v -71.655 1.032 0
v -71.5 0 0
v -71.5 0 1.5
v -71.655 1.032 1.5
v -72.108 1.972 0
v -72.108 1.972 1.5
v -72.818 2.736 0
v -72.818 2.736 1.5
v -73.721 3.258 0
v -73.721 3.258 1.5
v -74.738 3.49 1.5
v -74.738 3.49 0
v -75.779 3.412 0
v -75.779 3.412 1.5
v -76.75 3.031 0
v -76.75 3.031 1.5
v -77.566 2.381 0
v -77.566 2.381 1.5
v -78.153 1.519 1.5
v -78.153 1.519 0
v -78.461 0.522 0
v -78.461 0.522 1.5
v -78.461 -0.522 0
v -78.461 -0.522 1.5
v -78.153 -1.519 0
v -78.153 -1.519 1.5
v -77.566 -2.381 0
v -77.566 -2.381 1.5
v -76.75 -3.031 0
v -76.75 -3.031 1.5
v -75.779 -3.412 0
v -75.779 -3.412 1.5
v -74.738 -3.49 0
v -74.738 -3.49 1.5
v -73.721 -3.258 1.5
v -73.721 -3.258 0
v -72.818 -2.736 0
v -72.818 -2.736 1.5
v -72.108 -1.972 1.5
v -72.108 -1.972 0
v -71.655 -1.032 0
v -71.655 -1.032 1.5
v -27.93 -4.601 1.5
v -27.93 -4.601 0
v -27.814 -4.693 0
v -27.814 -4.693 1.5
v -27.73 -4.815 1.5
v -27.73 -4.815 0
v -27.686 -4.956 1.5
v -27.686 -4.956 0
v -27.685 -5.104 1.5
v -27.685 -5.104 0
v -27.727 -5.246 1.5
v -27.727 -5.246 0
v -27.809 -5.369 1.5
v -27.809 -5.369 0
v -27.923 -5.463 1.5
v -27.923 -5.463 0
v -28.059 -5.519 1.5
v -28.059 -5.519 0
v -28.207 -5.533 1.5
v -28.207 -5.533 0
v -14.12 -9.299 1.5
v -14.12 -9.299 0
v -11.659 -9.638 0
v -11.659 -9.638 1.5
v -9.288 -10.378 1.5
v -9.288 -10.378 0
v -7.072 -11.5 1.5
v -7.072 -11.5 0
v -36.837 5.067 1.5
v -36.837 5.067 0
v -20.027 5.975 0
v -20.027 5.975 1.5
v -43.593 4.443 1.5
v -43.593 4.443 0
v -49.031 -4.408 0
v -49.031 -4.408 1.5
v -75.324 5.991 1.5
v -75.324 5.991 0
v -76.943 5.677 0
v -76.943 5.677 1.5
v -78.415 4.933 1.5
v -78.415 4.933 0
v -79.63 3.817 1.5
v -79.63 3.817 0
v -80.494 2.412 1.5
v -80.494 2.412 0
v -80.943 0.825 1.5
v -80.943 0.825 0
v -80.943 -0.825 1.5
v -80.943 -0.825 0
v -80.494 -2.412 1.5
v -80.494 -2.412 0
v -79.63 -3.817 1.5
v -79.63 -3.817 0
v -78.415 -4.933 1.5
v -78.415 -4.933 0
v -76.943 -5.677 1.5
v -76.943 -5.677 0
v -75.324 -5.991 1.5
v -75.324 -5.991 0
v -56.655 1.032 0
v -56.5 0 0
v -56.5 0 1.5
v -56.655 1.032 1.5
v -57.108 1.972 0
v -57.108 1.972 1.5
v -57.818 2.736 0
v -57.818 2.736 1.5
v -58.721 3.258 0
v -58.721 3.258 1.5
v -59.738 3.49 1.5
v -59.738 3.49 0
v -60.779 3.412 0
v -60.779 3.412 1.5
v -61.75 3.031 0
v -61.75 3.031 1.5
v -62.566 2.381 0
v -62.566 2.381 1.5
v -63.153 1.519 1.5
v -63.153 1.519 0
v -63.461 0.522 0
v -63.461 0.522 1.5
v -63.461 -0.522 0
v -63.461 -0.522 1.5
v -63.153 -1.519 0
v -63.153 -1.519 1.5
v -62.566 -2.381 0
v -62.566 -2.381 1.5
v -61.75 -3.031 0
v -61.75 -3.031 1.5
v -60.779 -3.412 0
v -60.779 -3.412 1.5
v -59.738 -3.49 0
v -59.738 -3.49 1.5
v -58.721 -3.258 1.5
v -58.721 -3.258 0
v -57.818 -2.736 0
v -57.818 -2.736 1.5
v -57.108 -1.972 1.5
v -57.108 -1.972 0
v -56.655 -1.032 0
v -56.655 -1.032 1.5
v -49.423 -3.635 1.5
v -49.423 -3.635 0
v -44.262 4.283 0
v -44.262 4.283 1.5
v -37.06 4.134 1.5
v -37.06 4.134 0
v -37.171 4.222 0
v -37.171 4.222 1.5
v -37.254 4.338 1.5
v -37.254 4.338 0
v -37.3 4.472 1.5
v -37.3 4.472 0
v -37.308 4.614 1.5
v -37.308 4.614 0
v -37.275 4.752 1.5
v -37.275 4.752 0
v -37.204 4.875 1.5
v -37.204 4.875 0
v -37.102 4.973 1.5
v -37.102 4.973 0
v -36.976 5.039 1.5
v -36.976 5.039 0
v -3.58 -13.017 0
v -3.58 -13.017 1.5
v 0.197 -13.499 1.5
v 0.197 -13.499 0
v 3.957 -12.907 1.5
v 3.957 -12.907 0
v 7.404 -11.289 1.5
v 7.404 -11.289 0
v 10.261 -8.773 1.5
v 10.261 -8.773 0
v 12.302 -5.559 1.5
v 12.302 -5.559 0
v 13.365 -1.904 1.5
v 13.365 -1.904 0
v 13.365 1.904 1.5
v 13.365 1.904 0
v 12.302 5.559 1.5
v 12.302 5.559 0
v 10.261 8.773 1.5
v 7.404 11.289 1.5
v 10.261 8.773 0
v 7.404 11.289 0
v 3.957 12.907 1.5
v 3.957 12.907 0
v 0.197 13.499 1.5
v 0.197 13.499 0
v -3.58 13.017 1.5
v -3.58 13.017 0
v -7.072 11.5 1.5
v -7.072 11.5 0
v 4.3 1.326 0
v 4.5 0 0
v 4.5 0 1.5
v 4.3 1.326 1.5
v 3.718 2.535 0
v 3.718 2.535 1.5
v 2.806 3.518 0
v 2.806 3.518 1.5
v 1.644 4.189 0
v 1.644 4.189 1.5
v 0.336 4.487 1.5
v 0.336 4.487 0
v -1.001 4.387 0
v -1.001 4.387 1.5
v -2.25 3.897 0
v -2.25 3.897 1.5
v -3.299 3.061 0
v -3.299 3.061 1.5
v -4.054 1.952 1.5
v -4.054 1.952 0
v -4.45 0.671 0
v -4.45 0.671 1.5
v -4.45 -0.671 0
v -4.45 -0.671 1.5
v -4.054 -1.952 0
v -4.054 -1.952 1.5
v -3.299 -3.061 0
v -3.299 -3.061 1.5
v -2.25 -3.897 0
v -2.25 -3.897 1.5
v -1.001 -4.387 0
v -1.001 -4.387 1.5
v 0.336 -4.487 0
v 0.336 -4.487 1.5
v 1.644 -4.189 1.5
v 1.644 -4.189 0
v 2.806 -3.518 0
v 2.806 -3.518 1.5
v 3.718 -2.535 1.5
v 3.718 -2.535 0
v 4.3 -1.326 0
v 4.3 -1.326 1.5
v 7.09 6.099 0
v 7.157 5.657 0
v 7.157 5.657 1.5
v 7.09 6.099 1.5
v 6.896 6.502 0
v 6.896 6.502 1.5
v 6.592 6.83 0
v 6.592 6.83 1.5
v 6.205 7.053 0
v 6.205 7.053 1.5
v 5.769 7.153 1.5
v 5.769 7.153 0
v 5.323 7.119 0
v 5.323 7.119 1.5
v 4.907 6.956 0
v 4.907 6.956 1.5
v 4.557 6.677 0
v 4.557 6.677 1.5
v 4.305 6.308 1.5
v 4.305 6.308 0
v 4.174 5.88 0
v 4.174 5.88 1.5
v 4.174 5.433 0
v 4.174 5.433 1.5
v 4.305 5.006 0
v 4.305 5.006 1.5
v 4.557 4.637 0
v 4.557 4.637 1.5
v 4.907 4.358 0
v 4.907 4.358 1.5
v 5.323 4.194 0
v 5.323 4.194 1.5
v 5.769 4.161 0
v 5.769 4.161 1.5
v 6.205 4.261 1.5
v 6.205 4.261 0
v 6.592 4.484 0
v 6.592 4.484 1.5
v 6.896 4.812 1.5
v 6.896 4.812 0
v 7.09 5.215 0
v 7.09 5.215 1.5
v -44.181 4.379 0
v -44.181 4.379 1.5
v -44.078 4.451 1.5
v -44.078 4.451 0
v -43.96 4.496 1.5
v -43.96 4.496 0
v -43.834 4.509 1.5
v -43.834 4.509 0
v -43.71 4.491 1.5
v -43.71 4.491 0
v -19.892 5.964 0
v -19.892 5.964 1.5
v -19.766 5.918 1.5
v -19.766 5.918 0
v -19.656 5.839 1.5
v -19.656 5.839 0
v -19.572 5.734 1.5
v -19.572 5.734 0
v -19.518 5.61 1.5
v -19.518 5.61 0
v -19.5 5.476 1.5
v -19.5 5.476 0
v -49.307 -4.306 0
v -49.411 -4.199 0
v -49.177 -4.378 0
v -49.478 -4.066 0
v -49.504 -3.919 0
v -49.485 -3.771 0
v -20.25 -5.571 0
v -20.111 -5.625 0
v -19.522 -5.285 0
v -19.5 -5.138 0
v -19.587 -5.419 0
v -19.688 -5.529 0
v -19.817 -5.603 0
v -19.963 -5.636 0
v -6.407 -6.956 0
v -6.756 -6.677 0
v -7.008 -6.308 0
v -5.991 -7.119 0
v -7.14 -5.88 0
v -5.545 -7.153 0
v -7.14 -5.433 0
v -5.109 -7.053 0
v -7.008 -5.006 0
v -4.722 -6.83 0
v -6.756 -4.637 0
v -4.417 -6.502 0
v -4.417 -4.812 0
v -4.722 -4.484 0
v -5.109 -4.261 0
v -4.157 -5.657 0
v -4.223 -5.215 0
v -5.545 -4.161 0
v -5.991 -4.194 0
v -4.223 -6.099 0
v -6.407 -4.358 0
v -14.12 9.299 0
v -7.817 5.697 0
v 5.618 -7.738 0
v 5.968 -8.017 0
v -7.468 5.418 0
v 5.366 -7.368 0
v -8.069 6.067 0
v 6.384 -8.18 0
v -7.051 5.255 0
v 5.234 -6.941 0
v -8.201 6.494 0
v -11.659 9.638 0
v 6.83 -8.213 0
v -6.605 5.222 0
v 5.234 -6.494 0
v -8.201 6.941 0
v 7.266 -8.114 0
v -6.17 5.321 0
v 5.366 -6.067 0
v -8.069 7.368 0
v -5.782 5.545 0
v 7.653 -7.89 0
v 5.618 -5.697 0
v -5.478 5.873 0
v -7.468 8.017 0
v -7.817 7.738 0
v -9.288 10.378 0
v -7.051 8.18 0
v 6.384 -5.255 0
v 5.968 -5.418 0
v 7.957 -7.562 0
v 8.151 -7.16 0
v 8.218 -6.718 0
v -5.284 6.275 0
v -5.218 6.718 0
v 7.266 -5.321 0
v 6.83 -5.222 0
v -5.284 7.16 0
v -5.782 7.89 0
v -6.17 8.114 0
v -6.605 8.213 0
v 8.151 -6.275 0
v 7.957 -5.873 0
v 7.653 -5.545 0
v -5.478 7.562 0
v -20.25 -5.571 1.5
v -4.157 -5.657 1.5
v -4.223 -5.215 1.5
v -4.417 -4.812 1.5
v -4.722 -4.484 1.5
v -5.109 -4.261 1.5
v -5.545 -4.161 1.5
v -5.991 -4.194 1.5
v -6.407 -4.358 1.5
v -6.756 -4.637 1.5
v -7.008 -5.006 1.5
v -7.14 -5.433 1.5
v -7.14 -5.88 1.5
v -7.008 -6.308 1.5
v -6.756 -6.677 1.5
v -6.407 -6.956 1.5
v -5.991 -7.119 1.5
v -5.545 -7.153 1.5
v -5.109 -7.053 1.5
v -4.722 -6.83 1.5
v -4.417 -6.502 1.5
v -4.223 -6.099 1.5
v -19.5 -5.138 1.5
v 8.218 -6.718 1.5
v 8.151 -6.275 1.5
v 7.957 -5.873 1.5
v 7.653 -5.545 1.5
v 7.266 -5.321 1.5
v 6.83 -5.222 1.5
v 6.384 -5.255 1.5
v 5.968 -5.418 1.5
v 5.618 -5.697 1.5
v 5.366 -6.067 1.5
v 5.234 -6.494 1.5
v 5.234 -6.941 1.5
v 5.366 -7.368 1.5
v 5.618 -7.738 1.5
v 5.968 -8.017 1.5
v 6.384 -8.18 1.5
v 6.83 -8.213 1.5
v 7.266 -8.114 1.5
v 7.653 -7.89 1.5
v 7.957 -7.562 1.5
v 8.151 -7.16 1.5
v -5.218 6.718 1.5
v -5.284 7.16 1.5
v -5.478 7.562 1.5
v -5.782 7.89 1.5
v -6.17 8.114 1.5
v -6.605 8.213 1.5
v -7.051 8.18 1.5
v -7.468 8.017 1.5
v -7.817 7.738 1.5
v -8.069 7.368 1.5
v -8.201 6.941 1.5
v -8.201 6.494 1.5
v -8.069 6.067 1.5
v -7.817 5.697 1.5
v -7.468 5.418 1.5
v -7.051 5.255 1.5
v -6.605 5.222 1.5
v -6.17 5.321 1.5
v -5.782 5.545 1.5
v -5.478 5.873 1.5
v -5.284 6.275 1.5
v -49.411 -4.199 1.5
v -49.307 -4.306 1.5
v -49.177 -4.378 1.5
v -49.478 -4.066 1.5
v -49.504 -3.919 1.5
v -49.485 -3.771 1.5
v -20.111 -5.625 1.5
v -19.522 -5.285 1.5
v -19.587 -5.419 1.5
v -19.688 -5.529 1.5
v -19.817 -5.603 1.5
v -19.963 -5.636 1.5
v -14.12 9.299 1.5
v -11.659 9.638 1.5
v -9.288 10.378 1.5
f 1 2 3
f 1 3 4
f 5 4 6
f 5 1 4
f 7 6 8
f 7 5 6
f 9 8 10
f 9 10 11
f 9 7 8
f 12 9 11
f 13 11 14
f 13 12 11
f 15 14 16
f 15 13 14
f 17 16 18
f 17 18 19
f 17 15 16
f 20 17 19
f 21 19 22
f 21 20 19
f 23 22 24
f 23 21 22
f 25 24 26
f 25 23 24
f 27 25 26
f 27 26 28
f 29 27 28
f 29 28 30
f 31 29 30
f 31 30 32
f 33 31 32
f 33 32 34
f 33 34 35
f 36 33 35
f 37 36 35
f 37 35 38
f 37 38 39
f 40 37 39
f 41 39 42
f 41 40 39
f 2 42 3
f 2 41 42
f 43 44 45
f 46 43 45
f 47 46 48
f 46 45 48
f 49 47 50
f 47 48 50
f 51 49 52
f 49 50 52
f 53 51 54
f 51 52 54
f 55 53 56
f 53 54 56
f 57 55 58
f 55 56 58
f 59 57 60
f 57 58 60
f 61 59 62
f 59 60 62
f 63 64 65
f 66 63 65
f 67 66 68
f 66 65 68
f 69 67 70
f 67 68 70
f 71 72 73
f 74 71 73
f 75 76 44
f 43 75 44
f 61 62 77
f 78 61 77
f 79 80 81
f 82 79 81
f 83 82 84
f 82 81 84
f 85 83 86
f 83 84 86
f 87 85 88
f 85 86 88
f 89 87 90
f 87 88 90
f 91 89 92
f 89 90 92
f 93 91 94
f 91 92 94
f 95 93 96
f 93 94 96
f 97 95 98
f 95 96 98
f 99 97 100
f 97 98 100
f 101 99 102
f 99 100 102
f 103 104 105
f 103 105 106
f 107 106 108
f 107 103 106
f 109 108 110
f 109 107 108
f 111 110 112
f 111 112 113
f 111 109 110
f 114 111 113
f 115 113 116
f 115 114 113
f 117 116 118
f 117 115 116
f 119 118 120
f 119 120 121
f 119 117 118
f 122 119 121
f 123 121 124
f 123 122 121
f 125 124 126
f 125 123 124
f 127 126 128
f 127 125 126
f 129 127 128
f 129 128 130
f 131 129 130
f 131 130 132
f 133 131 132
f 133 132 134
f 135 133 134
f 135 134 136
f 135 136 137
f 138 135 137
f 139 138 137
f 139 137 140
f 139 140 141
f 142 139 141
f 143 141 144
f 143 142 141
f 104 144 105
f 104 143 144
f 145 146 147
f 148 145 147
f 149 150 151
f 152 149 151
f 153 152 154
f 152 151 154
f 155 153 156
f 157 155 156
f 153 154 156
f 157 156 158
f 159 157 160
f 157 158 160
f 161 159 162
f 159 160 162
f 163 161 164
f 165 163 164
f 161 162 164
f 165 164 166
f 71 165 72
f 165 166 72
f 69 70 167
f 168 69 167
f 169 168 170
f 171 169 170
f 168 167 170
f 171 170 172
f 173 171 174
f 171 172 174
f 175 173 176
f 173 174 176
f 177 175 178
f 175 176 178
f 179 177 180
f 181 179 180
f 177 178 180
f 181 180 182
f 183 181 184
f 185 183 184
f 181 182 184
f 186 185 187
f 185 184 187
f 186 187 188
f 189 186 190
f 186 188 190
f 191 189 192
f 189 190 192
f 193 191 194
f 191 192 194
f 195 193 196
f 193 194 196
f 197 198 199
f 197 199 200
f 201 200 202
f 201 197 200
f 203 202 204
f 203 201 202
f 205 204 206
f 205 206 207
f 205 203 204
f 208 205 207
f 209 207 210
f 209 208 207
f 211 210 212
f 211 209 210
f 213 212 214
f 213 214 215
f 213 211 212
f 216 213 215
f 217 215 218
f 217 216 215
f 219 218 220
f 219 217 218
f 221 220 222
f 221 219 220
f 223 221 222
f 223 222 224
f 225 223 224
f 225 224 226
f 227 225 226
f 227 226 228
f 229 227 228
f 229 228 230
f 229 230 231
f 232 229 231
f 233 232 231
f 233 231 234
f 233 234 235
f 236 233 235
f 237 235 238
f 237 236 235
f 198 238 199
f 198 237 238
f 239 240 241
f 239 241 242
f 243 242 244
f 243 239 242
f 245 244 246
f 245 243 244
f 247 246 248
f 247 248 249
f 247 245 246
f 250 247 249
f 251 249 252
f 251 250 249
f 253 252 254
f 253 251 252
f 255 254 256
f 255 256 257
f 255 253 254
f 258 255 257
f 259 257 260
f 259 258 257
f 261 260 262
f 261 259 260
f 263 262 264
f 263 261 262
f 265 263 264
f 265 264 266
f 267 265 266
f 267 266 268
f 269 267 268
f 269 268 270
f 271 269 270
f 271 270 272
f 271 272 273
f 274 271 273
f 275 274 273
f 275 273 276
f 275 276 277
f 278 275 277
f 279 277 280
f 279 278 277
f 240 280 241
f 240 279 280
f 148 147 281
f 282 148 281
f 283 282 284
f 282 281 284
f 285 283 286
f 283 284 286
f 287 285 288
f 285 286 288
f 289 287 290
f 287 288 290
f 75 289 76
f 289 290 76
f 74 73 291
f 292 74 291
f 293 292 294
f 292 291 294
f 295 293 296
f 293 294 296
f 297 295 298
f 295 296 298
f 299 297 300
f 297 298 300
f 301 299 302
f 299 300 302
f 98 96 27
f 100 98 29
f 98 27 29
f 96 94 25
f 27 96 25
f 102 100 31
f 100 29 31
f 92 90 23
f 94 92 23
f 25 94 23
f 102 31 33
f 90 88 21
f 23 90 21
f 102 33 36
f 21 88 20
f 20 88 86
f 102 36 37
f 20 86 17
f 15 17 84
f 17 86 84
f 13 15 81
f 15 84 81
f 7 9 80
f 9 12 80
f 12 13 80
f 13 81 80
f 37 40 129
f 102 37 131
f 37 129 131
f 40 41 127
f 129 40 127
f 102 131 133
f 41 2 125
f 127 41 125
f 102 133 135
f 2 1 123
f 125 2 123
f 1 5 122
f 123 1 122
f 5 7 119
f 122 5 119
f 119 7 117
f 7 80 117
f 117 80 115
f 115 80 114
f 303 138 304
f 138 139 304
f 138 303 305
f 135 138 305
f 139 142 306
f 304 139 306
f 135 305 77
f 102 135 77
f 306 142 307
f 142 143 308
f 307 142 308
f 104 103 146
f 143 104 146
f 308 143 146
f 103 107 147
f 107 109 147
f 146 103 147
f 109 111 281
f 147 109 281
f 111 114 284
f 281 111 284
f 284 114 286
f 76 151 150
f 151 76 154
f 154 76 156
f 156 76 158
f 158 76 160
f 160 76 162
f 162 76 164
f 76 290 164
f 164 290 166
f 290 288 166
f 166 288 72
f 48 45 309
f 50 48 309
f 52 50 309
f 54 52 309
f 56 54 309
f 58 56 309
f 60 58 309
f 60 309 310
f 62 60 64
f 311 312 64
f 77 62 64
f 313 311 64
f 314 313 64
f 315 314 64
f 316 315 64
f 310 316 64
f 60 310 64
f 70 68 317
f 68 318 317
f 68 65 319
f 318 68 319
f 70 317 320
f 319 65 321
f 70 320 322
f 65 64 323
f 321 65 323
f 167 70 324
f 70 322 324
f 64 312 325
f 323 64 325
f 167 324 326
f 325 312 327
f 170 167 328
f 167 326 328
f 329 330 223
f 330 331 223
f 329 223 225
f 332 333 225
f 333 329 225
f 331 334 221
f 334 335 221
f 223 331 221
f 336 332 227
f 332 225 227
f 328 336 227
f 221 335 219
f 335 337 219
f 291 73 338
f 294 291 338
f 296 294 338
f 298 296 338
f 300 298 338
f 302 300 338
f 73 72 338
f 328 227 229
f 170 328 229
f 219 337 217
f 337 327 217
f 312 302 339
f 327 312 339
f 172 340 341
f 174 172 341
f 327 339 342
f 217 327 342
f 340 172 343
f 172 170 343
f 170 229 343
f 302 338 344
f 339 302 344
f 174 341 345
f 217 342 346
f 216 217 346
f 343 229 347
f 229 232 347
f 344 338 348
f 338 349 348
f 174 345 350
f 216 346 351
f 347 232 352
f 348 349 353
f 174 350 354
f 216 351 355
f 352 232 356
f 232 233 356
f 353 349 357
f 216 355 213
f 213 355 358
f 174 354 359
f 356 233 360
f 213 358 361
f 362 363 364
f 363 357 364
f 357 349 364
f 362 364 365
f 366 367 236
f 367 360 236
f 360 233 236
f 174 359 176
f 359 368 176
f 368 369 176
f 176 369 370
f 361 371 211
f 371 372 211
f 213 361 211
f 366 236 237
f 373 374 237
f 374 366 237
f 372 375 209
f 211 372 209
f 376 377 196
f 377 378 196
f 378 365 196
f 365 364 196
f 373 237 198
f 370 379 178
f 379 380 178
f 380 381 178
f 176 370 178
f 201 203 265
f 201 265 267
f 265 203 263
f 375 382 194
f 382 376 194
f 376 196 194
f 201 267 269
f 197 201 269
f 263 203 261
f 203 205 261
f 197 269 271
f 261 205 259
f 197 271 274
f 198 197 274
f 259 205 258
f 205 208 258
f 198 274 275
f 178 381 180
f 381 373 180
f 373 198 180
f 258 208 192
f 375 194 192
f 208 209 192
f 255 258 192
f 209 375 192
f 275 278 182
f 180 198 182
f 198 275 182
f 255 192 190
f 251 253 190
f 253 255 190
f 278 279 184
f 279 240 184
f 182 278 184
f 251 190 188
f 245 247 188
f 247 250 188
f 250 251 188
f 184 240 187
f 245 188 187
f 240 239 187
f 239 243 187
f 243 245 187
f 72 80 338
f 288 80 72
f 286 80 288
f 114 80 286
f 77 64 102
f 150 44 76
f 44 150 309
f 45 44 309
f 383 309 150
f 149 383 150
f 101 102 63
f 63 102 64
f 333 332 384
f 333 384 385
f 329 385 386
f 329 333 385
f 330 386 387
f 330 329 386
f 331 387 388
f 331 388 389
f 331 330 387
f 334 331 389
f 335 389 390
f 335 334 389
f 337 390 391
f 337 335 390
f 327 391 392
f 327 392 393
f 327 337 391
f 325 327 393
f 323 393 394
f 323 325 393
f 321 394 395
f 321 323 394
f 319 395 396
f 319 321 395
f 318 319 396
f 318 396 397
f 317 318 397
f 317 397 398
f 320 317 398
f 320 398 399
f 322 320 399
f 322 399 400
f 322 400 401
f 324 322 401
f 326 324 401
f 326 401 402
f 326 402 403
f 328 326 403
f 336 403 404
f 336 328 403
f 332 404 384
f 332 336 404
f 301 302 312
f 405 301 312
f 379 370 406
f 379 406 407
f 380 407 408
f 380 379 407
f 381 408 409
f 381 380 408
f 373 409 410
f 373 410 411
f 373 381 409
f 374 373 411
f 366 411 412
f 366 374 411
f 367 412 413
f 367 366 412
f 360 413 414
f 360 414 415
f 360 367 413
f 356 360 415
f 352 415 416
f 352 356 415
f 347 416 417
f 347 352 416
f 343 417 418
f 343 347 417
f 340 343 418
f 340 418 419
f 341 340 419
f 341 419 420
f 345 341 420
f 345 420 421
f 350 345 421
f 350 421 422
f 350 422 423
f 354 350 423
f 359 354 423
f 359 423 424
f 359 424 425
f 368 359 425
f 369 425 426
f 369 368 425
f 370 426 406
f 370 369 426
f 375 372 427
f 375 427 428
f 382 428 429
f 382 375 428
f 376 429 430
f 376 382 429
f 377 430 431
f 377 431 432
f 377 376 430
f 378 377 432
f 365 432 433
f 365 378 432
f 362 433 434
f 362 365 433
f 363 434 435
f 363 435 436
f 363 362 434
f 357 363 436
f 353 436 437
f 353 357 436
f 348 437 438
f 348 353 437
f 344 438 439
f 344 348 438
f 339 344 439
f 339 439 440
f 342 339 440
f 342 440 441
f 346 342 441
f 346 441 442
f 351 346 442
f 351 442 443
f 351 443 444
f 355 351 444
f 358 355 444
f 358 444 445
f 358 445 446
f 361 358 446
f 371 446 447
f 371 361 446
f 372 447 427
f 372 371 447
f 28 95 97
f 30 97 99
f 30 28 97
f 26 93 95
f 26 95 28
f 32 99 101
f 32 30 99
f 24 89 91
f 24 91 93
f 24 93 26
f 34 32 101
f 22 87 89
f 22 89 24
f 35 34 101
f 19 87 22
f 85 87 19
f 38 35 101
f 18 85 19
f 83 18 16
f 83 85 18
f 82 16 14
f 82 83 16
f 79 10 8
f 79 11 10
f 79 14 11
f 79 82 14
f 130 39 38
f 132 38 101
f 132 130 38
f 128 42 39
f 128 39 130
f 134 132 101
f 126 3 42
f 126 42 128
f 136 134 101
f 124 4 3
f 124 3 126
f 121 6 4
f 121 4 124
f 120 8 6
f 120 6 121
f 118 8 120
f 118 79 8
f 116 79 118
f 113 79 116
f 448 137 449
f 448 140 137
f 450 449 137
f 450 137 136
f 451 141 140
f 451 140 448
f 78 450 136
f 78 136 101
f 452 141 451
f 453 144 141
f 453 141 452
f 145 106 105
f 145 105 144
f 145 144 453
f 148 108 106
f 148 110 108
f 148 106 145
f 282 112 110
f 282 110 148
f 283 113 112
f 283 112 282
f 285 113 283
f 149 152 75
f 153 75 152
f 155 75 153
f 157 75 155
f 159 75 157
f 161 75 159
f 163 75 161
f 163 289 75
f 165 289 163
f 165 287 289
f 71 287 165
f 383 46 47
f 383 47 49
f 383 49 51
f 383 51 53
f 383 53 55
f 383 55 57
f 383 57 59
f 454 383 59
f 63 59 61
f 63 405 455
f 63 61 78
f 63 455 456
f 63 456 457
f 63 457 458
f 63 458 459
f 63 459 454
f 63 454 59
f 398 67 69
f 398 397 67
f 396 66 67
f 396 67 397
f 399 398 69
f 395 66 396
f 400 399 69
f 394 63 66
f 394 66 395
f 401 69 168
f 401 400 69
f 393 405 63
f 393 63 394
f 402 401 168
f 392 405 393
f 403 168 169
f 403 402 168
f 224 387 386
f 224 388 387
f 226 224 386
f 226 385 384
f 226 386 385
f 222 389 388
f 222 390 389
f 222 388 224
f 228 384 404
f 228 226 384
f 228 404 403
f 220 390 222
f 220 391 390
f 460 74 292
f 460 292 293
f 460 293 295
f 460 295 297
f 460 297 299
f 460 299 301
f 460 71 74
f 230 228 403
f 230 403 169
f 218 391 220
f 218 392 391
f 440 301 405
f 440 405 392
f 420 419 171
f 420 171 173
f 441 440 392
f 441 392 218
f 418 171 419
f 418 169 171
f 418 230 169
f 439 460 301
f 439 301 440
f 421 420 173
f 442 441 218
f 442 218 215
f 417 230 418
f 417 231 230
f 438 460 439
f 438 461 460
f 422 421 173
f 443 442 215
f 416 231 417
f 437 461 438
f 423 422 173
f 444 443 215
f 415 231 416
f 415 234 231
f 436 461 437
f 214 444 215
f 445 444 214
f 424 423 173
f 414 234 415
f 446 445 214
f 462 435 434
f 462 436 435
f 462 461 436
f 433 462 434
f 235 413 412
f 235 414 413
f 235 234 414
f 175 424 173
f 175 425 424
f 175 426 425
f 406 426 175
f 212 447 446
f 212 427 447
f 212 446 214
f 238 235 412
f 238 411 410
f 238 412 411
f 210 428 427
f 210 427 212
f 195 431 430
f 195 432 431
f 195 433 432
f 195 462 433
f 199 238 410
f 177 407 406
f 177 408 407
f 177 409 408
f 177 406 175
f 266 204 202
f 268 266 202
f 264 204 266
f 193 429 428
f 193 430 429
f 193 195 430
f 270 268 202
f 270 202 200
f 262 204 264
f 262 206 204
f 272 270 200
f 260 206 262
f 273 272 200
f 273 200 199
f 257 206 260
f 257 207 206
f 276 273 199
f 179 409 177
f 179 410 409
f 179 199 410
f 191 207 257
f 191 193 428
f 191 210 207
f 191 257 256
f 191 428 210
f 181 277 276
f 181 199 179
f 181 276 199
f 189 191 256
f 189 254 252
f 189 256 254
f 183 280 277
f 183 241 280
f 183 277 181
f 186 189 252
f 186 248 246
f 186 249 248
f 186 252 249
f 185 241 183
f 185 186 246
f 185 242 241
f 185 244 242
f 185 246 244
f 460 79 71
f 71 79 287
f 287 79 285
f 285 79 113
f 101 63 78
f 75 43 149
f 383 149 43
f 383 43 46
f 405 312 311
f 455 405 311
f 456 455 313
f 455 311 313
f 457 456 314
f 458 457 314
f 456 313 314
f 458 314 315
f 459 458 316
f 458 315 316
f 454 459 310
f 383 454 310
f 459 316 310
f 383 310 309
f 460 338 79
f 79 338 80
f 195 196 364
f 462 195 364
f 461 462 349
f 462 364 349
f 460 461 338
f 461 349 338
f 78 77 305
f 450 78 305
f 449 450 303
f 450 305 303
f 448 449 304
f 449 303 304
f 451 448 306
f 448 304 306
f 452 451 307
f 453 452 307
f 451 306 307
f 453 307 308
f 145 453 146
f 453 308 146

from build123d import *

# Parameters (mm, degrees)
SKETCH_1_R      = 1.5
SKETCH_1_R_2    = 4.5
SKETCH_1_R_3    = 3.5
EXTRUDE_1_DEPTH = 1.5


with BuildPart() as part:
    # 草图1 → 凸台-拉伸1 (new body)
    with BuildSketch(Plane.XY):
        with BuildLine():
            Line((-14.119787017, 9.298767484), (-75.323772101, 5.991257934))
            ThreePointArc((-75.323772101, 5.991257934), (-81, 0), (-75.323772101, -5.991257934))
            Line((-75.323772101, -5.991257934), (-14.119787017, -9.298767484))
            ThreePointArc((-14.119787017, -9.298767484), (-10.458227409, -9.958733326), (-7.071734496, -11.499590046))
            ThreePointArc((-7.071734496, -11.499590046), (13.5, 0), (-7.071734496, 11.499590046))
            ThreePointArc((-7.071734496, 11.499590046), (-10.458227409, 9.958733326), (-14.119787017, 9.298767484))
        make_face()
        with Locations((-5.656854249, -5.656854249)):
            Circle(SKETCH_1_R, mode=Mode.SUBTRACT)
        with Locations((-6.717514421, 6.717514421)):
            Circle(SKETCH_1_R, mode=Mode.SUBTRACT)
        with Locations((5.656854249, 5.656854249)):
            Circle(SKETCH_1_R, mode=Mode.SUBTRACT)
        with Locations((6.717514421, -6.717514421)):
            Circle(SKETCH_1_R, mode=Mode.SUBTRACT)
        Circle(SKETCH_1_R_2, mode=Mode.SUBTRACT)
        with Locations((-60, 0)):
            Circle(SKETCH_1_R_3, mode=Mode.SUBTRACT)
        with Locations((-75, 0)):
            Circle(SKETCH_1_R_3, mode=Mode.SUBTRACT)
        with BuildLine():
            Line((-19.5, 5.475889357), (-19.5, -5.137613899))
            ThreePointArc((-19.5, -5.137613899), (-19.75, -5.570626601), (-20.25, -5.570626601))
            Line((-20.25, -5.570626601), (-37.059715141, 4.134466961))
            ThreePointArc((-37.059715141, 4.134466961), (-37.295994973, 4.683806463), (-36.836696149, 5.066751157))
            Line((-36.836696149, 5.066751157), (-20.026981008, 5.975160851))
            ThreePointArc((-20.026981008, 5.975160851), (-19.656118119, 5.838856645), (-19.5, 5.475889357))
        make_face(mode=Mode.SUBTRACT)
        with BuildLine():
            Line((-43.593398767, 4.442589346), (-27.929722665, -4.600838268))
            ThreePointArc((-27.929722665, -4.600838268), (-27.700428576, -5.176248922), (-28.206703673, -5.533122464))
            Line((-28.206703673, -5.533122464), (-49.030790414, -4.407773099))
            ThreePointArc((-49.030790414, -4.407773099), (-49.449681707, -4.134771113), (-49.422700699, -3.635499618))
            Line((-49.422700699, -3.635499618), (-44.262290061, 4.28257863))
            ThreePointArc((-44.262290061, 4.28257863), (-43.959725568, 4.495856477), (-43.593398767, 4.442589346))
        make_face(mode=Mode.SUBTRACT)
    extrude(amount=EXTRUDE_1_DEPTH)


solid = part.part
